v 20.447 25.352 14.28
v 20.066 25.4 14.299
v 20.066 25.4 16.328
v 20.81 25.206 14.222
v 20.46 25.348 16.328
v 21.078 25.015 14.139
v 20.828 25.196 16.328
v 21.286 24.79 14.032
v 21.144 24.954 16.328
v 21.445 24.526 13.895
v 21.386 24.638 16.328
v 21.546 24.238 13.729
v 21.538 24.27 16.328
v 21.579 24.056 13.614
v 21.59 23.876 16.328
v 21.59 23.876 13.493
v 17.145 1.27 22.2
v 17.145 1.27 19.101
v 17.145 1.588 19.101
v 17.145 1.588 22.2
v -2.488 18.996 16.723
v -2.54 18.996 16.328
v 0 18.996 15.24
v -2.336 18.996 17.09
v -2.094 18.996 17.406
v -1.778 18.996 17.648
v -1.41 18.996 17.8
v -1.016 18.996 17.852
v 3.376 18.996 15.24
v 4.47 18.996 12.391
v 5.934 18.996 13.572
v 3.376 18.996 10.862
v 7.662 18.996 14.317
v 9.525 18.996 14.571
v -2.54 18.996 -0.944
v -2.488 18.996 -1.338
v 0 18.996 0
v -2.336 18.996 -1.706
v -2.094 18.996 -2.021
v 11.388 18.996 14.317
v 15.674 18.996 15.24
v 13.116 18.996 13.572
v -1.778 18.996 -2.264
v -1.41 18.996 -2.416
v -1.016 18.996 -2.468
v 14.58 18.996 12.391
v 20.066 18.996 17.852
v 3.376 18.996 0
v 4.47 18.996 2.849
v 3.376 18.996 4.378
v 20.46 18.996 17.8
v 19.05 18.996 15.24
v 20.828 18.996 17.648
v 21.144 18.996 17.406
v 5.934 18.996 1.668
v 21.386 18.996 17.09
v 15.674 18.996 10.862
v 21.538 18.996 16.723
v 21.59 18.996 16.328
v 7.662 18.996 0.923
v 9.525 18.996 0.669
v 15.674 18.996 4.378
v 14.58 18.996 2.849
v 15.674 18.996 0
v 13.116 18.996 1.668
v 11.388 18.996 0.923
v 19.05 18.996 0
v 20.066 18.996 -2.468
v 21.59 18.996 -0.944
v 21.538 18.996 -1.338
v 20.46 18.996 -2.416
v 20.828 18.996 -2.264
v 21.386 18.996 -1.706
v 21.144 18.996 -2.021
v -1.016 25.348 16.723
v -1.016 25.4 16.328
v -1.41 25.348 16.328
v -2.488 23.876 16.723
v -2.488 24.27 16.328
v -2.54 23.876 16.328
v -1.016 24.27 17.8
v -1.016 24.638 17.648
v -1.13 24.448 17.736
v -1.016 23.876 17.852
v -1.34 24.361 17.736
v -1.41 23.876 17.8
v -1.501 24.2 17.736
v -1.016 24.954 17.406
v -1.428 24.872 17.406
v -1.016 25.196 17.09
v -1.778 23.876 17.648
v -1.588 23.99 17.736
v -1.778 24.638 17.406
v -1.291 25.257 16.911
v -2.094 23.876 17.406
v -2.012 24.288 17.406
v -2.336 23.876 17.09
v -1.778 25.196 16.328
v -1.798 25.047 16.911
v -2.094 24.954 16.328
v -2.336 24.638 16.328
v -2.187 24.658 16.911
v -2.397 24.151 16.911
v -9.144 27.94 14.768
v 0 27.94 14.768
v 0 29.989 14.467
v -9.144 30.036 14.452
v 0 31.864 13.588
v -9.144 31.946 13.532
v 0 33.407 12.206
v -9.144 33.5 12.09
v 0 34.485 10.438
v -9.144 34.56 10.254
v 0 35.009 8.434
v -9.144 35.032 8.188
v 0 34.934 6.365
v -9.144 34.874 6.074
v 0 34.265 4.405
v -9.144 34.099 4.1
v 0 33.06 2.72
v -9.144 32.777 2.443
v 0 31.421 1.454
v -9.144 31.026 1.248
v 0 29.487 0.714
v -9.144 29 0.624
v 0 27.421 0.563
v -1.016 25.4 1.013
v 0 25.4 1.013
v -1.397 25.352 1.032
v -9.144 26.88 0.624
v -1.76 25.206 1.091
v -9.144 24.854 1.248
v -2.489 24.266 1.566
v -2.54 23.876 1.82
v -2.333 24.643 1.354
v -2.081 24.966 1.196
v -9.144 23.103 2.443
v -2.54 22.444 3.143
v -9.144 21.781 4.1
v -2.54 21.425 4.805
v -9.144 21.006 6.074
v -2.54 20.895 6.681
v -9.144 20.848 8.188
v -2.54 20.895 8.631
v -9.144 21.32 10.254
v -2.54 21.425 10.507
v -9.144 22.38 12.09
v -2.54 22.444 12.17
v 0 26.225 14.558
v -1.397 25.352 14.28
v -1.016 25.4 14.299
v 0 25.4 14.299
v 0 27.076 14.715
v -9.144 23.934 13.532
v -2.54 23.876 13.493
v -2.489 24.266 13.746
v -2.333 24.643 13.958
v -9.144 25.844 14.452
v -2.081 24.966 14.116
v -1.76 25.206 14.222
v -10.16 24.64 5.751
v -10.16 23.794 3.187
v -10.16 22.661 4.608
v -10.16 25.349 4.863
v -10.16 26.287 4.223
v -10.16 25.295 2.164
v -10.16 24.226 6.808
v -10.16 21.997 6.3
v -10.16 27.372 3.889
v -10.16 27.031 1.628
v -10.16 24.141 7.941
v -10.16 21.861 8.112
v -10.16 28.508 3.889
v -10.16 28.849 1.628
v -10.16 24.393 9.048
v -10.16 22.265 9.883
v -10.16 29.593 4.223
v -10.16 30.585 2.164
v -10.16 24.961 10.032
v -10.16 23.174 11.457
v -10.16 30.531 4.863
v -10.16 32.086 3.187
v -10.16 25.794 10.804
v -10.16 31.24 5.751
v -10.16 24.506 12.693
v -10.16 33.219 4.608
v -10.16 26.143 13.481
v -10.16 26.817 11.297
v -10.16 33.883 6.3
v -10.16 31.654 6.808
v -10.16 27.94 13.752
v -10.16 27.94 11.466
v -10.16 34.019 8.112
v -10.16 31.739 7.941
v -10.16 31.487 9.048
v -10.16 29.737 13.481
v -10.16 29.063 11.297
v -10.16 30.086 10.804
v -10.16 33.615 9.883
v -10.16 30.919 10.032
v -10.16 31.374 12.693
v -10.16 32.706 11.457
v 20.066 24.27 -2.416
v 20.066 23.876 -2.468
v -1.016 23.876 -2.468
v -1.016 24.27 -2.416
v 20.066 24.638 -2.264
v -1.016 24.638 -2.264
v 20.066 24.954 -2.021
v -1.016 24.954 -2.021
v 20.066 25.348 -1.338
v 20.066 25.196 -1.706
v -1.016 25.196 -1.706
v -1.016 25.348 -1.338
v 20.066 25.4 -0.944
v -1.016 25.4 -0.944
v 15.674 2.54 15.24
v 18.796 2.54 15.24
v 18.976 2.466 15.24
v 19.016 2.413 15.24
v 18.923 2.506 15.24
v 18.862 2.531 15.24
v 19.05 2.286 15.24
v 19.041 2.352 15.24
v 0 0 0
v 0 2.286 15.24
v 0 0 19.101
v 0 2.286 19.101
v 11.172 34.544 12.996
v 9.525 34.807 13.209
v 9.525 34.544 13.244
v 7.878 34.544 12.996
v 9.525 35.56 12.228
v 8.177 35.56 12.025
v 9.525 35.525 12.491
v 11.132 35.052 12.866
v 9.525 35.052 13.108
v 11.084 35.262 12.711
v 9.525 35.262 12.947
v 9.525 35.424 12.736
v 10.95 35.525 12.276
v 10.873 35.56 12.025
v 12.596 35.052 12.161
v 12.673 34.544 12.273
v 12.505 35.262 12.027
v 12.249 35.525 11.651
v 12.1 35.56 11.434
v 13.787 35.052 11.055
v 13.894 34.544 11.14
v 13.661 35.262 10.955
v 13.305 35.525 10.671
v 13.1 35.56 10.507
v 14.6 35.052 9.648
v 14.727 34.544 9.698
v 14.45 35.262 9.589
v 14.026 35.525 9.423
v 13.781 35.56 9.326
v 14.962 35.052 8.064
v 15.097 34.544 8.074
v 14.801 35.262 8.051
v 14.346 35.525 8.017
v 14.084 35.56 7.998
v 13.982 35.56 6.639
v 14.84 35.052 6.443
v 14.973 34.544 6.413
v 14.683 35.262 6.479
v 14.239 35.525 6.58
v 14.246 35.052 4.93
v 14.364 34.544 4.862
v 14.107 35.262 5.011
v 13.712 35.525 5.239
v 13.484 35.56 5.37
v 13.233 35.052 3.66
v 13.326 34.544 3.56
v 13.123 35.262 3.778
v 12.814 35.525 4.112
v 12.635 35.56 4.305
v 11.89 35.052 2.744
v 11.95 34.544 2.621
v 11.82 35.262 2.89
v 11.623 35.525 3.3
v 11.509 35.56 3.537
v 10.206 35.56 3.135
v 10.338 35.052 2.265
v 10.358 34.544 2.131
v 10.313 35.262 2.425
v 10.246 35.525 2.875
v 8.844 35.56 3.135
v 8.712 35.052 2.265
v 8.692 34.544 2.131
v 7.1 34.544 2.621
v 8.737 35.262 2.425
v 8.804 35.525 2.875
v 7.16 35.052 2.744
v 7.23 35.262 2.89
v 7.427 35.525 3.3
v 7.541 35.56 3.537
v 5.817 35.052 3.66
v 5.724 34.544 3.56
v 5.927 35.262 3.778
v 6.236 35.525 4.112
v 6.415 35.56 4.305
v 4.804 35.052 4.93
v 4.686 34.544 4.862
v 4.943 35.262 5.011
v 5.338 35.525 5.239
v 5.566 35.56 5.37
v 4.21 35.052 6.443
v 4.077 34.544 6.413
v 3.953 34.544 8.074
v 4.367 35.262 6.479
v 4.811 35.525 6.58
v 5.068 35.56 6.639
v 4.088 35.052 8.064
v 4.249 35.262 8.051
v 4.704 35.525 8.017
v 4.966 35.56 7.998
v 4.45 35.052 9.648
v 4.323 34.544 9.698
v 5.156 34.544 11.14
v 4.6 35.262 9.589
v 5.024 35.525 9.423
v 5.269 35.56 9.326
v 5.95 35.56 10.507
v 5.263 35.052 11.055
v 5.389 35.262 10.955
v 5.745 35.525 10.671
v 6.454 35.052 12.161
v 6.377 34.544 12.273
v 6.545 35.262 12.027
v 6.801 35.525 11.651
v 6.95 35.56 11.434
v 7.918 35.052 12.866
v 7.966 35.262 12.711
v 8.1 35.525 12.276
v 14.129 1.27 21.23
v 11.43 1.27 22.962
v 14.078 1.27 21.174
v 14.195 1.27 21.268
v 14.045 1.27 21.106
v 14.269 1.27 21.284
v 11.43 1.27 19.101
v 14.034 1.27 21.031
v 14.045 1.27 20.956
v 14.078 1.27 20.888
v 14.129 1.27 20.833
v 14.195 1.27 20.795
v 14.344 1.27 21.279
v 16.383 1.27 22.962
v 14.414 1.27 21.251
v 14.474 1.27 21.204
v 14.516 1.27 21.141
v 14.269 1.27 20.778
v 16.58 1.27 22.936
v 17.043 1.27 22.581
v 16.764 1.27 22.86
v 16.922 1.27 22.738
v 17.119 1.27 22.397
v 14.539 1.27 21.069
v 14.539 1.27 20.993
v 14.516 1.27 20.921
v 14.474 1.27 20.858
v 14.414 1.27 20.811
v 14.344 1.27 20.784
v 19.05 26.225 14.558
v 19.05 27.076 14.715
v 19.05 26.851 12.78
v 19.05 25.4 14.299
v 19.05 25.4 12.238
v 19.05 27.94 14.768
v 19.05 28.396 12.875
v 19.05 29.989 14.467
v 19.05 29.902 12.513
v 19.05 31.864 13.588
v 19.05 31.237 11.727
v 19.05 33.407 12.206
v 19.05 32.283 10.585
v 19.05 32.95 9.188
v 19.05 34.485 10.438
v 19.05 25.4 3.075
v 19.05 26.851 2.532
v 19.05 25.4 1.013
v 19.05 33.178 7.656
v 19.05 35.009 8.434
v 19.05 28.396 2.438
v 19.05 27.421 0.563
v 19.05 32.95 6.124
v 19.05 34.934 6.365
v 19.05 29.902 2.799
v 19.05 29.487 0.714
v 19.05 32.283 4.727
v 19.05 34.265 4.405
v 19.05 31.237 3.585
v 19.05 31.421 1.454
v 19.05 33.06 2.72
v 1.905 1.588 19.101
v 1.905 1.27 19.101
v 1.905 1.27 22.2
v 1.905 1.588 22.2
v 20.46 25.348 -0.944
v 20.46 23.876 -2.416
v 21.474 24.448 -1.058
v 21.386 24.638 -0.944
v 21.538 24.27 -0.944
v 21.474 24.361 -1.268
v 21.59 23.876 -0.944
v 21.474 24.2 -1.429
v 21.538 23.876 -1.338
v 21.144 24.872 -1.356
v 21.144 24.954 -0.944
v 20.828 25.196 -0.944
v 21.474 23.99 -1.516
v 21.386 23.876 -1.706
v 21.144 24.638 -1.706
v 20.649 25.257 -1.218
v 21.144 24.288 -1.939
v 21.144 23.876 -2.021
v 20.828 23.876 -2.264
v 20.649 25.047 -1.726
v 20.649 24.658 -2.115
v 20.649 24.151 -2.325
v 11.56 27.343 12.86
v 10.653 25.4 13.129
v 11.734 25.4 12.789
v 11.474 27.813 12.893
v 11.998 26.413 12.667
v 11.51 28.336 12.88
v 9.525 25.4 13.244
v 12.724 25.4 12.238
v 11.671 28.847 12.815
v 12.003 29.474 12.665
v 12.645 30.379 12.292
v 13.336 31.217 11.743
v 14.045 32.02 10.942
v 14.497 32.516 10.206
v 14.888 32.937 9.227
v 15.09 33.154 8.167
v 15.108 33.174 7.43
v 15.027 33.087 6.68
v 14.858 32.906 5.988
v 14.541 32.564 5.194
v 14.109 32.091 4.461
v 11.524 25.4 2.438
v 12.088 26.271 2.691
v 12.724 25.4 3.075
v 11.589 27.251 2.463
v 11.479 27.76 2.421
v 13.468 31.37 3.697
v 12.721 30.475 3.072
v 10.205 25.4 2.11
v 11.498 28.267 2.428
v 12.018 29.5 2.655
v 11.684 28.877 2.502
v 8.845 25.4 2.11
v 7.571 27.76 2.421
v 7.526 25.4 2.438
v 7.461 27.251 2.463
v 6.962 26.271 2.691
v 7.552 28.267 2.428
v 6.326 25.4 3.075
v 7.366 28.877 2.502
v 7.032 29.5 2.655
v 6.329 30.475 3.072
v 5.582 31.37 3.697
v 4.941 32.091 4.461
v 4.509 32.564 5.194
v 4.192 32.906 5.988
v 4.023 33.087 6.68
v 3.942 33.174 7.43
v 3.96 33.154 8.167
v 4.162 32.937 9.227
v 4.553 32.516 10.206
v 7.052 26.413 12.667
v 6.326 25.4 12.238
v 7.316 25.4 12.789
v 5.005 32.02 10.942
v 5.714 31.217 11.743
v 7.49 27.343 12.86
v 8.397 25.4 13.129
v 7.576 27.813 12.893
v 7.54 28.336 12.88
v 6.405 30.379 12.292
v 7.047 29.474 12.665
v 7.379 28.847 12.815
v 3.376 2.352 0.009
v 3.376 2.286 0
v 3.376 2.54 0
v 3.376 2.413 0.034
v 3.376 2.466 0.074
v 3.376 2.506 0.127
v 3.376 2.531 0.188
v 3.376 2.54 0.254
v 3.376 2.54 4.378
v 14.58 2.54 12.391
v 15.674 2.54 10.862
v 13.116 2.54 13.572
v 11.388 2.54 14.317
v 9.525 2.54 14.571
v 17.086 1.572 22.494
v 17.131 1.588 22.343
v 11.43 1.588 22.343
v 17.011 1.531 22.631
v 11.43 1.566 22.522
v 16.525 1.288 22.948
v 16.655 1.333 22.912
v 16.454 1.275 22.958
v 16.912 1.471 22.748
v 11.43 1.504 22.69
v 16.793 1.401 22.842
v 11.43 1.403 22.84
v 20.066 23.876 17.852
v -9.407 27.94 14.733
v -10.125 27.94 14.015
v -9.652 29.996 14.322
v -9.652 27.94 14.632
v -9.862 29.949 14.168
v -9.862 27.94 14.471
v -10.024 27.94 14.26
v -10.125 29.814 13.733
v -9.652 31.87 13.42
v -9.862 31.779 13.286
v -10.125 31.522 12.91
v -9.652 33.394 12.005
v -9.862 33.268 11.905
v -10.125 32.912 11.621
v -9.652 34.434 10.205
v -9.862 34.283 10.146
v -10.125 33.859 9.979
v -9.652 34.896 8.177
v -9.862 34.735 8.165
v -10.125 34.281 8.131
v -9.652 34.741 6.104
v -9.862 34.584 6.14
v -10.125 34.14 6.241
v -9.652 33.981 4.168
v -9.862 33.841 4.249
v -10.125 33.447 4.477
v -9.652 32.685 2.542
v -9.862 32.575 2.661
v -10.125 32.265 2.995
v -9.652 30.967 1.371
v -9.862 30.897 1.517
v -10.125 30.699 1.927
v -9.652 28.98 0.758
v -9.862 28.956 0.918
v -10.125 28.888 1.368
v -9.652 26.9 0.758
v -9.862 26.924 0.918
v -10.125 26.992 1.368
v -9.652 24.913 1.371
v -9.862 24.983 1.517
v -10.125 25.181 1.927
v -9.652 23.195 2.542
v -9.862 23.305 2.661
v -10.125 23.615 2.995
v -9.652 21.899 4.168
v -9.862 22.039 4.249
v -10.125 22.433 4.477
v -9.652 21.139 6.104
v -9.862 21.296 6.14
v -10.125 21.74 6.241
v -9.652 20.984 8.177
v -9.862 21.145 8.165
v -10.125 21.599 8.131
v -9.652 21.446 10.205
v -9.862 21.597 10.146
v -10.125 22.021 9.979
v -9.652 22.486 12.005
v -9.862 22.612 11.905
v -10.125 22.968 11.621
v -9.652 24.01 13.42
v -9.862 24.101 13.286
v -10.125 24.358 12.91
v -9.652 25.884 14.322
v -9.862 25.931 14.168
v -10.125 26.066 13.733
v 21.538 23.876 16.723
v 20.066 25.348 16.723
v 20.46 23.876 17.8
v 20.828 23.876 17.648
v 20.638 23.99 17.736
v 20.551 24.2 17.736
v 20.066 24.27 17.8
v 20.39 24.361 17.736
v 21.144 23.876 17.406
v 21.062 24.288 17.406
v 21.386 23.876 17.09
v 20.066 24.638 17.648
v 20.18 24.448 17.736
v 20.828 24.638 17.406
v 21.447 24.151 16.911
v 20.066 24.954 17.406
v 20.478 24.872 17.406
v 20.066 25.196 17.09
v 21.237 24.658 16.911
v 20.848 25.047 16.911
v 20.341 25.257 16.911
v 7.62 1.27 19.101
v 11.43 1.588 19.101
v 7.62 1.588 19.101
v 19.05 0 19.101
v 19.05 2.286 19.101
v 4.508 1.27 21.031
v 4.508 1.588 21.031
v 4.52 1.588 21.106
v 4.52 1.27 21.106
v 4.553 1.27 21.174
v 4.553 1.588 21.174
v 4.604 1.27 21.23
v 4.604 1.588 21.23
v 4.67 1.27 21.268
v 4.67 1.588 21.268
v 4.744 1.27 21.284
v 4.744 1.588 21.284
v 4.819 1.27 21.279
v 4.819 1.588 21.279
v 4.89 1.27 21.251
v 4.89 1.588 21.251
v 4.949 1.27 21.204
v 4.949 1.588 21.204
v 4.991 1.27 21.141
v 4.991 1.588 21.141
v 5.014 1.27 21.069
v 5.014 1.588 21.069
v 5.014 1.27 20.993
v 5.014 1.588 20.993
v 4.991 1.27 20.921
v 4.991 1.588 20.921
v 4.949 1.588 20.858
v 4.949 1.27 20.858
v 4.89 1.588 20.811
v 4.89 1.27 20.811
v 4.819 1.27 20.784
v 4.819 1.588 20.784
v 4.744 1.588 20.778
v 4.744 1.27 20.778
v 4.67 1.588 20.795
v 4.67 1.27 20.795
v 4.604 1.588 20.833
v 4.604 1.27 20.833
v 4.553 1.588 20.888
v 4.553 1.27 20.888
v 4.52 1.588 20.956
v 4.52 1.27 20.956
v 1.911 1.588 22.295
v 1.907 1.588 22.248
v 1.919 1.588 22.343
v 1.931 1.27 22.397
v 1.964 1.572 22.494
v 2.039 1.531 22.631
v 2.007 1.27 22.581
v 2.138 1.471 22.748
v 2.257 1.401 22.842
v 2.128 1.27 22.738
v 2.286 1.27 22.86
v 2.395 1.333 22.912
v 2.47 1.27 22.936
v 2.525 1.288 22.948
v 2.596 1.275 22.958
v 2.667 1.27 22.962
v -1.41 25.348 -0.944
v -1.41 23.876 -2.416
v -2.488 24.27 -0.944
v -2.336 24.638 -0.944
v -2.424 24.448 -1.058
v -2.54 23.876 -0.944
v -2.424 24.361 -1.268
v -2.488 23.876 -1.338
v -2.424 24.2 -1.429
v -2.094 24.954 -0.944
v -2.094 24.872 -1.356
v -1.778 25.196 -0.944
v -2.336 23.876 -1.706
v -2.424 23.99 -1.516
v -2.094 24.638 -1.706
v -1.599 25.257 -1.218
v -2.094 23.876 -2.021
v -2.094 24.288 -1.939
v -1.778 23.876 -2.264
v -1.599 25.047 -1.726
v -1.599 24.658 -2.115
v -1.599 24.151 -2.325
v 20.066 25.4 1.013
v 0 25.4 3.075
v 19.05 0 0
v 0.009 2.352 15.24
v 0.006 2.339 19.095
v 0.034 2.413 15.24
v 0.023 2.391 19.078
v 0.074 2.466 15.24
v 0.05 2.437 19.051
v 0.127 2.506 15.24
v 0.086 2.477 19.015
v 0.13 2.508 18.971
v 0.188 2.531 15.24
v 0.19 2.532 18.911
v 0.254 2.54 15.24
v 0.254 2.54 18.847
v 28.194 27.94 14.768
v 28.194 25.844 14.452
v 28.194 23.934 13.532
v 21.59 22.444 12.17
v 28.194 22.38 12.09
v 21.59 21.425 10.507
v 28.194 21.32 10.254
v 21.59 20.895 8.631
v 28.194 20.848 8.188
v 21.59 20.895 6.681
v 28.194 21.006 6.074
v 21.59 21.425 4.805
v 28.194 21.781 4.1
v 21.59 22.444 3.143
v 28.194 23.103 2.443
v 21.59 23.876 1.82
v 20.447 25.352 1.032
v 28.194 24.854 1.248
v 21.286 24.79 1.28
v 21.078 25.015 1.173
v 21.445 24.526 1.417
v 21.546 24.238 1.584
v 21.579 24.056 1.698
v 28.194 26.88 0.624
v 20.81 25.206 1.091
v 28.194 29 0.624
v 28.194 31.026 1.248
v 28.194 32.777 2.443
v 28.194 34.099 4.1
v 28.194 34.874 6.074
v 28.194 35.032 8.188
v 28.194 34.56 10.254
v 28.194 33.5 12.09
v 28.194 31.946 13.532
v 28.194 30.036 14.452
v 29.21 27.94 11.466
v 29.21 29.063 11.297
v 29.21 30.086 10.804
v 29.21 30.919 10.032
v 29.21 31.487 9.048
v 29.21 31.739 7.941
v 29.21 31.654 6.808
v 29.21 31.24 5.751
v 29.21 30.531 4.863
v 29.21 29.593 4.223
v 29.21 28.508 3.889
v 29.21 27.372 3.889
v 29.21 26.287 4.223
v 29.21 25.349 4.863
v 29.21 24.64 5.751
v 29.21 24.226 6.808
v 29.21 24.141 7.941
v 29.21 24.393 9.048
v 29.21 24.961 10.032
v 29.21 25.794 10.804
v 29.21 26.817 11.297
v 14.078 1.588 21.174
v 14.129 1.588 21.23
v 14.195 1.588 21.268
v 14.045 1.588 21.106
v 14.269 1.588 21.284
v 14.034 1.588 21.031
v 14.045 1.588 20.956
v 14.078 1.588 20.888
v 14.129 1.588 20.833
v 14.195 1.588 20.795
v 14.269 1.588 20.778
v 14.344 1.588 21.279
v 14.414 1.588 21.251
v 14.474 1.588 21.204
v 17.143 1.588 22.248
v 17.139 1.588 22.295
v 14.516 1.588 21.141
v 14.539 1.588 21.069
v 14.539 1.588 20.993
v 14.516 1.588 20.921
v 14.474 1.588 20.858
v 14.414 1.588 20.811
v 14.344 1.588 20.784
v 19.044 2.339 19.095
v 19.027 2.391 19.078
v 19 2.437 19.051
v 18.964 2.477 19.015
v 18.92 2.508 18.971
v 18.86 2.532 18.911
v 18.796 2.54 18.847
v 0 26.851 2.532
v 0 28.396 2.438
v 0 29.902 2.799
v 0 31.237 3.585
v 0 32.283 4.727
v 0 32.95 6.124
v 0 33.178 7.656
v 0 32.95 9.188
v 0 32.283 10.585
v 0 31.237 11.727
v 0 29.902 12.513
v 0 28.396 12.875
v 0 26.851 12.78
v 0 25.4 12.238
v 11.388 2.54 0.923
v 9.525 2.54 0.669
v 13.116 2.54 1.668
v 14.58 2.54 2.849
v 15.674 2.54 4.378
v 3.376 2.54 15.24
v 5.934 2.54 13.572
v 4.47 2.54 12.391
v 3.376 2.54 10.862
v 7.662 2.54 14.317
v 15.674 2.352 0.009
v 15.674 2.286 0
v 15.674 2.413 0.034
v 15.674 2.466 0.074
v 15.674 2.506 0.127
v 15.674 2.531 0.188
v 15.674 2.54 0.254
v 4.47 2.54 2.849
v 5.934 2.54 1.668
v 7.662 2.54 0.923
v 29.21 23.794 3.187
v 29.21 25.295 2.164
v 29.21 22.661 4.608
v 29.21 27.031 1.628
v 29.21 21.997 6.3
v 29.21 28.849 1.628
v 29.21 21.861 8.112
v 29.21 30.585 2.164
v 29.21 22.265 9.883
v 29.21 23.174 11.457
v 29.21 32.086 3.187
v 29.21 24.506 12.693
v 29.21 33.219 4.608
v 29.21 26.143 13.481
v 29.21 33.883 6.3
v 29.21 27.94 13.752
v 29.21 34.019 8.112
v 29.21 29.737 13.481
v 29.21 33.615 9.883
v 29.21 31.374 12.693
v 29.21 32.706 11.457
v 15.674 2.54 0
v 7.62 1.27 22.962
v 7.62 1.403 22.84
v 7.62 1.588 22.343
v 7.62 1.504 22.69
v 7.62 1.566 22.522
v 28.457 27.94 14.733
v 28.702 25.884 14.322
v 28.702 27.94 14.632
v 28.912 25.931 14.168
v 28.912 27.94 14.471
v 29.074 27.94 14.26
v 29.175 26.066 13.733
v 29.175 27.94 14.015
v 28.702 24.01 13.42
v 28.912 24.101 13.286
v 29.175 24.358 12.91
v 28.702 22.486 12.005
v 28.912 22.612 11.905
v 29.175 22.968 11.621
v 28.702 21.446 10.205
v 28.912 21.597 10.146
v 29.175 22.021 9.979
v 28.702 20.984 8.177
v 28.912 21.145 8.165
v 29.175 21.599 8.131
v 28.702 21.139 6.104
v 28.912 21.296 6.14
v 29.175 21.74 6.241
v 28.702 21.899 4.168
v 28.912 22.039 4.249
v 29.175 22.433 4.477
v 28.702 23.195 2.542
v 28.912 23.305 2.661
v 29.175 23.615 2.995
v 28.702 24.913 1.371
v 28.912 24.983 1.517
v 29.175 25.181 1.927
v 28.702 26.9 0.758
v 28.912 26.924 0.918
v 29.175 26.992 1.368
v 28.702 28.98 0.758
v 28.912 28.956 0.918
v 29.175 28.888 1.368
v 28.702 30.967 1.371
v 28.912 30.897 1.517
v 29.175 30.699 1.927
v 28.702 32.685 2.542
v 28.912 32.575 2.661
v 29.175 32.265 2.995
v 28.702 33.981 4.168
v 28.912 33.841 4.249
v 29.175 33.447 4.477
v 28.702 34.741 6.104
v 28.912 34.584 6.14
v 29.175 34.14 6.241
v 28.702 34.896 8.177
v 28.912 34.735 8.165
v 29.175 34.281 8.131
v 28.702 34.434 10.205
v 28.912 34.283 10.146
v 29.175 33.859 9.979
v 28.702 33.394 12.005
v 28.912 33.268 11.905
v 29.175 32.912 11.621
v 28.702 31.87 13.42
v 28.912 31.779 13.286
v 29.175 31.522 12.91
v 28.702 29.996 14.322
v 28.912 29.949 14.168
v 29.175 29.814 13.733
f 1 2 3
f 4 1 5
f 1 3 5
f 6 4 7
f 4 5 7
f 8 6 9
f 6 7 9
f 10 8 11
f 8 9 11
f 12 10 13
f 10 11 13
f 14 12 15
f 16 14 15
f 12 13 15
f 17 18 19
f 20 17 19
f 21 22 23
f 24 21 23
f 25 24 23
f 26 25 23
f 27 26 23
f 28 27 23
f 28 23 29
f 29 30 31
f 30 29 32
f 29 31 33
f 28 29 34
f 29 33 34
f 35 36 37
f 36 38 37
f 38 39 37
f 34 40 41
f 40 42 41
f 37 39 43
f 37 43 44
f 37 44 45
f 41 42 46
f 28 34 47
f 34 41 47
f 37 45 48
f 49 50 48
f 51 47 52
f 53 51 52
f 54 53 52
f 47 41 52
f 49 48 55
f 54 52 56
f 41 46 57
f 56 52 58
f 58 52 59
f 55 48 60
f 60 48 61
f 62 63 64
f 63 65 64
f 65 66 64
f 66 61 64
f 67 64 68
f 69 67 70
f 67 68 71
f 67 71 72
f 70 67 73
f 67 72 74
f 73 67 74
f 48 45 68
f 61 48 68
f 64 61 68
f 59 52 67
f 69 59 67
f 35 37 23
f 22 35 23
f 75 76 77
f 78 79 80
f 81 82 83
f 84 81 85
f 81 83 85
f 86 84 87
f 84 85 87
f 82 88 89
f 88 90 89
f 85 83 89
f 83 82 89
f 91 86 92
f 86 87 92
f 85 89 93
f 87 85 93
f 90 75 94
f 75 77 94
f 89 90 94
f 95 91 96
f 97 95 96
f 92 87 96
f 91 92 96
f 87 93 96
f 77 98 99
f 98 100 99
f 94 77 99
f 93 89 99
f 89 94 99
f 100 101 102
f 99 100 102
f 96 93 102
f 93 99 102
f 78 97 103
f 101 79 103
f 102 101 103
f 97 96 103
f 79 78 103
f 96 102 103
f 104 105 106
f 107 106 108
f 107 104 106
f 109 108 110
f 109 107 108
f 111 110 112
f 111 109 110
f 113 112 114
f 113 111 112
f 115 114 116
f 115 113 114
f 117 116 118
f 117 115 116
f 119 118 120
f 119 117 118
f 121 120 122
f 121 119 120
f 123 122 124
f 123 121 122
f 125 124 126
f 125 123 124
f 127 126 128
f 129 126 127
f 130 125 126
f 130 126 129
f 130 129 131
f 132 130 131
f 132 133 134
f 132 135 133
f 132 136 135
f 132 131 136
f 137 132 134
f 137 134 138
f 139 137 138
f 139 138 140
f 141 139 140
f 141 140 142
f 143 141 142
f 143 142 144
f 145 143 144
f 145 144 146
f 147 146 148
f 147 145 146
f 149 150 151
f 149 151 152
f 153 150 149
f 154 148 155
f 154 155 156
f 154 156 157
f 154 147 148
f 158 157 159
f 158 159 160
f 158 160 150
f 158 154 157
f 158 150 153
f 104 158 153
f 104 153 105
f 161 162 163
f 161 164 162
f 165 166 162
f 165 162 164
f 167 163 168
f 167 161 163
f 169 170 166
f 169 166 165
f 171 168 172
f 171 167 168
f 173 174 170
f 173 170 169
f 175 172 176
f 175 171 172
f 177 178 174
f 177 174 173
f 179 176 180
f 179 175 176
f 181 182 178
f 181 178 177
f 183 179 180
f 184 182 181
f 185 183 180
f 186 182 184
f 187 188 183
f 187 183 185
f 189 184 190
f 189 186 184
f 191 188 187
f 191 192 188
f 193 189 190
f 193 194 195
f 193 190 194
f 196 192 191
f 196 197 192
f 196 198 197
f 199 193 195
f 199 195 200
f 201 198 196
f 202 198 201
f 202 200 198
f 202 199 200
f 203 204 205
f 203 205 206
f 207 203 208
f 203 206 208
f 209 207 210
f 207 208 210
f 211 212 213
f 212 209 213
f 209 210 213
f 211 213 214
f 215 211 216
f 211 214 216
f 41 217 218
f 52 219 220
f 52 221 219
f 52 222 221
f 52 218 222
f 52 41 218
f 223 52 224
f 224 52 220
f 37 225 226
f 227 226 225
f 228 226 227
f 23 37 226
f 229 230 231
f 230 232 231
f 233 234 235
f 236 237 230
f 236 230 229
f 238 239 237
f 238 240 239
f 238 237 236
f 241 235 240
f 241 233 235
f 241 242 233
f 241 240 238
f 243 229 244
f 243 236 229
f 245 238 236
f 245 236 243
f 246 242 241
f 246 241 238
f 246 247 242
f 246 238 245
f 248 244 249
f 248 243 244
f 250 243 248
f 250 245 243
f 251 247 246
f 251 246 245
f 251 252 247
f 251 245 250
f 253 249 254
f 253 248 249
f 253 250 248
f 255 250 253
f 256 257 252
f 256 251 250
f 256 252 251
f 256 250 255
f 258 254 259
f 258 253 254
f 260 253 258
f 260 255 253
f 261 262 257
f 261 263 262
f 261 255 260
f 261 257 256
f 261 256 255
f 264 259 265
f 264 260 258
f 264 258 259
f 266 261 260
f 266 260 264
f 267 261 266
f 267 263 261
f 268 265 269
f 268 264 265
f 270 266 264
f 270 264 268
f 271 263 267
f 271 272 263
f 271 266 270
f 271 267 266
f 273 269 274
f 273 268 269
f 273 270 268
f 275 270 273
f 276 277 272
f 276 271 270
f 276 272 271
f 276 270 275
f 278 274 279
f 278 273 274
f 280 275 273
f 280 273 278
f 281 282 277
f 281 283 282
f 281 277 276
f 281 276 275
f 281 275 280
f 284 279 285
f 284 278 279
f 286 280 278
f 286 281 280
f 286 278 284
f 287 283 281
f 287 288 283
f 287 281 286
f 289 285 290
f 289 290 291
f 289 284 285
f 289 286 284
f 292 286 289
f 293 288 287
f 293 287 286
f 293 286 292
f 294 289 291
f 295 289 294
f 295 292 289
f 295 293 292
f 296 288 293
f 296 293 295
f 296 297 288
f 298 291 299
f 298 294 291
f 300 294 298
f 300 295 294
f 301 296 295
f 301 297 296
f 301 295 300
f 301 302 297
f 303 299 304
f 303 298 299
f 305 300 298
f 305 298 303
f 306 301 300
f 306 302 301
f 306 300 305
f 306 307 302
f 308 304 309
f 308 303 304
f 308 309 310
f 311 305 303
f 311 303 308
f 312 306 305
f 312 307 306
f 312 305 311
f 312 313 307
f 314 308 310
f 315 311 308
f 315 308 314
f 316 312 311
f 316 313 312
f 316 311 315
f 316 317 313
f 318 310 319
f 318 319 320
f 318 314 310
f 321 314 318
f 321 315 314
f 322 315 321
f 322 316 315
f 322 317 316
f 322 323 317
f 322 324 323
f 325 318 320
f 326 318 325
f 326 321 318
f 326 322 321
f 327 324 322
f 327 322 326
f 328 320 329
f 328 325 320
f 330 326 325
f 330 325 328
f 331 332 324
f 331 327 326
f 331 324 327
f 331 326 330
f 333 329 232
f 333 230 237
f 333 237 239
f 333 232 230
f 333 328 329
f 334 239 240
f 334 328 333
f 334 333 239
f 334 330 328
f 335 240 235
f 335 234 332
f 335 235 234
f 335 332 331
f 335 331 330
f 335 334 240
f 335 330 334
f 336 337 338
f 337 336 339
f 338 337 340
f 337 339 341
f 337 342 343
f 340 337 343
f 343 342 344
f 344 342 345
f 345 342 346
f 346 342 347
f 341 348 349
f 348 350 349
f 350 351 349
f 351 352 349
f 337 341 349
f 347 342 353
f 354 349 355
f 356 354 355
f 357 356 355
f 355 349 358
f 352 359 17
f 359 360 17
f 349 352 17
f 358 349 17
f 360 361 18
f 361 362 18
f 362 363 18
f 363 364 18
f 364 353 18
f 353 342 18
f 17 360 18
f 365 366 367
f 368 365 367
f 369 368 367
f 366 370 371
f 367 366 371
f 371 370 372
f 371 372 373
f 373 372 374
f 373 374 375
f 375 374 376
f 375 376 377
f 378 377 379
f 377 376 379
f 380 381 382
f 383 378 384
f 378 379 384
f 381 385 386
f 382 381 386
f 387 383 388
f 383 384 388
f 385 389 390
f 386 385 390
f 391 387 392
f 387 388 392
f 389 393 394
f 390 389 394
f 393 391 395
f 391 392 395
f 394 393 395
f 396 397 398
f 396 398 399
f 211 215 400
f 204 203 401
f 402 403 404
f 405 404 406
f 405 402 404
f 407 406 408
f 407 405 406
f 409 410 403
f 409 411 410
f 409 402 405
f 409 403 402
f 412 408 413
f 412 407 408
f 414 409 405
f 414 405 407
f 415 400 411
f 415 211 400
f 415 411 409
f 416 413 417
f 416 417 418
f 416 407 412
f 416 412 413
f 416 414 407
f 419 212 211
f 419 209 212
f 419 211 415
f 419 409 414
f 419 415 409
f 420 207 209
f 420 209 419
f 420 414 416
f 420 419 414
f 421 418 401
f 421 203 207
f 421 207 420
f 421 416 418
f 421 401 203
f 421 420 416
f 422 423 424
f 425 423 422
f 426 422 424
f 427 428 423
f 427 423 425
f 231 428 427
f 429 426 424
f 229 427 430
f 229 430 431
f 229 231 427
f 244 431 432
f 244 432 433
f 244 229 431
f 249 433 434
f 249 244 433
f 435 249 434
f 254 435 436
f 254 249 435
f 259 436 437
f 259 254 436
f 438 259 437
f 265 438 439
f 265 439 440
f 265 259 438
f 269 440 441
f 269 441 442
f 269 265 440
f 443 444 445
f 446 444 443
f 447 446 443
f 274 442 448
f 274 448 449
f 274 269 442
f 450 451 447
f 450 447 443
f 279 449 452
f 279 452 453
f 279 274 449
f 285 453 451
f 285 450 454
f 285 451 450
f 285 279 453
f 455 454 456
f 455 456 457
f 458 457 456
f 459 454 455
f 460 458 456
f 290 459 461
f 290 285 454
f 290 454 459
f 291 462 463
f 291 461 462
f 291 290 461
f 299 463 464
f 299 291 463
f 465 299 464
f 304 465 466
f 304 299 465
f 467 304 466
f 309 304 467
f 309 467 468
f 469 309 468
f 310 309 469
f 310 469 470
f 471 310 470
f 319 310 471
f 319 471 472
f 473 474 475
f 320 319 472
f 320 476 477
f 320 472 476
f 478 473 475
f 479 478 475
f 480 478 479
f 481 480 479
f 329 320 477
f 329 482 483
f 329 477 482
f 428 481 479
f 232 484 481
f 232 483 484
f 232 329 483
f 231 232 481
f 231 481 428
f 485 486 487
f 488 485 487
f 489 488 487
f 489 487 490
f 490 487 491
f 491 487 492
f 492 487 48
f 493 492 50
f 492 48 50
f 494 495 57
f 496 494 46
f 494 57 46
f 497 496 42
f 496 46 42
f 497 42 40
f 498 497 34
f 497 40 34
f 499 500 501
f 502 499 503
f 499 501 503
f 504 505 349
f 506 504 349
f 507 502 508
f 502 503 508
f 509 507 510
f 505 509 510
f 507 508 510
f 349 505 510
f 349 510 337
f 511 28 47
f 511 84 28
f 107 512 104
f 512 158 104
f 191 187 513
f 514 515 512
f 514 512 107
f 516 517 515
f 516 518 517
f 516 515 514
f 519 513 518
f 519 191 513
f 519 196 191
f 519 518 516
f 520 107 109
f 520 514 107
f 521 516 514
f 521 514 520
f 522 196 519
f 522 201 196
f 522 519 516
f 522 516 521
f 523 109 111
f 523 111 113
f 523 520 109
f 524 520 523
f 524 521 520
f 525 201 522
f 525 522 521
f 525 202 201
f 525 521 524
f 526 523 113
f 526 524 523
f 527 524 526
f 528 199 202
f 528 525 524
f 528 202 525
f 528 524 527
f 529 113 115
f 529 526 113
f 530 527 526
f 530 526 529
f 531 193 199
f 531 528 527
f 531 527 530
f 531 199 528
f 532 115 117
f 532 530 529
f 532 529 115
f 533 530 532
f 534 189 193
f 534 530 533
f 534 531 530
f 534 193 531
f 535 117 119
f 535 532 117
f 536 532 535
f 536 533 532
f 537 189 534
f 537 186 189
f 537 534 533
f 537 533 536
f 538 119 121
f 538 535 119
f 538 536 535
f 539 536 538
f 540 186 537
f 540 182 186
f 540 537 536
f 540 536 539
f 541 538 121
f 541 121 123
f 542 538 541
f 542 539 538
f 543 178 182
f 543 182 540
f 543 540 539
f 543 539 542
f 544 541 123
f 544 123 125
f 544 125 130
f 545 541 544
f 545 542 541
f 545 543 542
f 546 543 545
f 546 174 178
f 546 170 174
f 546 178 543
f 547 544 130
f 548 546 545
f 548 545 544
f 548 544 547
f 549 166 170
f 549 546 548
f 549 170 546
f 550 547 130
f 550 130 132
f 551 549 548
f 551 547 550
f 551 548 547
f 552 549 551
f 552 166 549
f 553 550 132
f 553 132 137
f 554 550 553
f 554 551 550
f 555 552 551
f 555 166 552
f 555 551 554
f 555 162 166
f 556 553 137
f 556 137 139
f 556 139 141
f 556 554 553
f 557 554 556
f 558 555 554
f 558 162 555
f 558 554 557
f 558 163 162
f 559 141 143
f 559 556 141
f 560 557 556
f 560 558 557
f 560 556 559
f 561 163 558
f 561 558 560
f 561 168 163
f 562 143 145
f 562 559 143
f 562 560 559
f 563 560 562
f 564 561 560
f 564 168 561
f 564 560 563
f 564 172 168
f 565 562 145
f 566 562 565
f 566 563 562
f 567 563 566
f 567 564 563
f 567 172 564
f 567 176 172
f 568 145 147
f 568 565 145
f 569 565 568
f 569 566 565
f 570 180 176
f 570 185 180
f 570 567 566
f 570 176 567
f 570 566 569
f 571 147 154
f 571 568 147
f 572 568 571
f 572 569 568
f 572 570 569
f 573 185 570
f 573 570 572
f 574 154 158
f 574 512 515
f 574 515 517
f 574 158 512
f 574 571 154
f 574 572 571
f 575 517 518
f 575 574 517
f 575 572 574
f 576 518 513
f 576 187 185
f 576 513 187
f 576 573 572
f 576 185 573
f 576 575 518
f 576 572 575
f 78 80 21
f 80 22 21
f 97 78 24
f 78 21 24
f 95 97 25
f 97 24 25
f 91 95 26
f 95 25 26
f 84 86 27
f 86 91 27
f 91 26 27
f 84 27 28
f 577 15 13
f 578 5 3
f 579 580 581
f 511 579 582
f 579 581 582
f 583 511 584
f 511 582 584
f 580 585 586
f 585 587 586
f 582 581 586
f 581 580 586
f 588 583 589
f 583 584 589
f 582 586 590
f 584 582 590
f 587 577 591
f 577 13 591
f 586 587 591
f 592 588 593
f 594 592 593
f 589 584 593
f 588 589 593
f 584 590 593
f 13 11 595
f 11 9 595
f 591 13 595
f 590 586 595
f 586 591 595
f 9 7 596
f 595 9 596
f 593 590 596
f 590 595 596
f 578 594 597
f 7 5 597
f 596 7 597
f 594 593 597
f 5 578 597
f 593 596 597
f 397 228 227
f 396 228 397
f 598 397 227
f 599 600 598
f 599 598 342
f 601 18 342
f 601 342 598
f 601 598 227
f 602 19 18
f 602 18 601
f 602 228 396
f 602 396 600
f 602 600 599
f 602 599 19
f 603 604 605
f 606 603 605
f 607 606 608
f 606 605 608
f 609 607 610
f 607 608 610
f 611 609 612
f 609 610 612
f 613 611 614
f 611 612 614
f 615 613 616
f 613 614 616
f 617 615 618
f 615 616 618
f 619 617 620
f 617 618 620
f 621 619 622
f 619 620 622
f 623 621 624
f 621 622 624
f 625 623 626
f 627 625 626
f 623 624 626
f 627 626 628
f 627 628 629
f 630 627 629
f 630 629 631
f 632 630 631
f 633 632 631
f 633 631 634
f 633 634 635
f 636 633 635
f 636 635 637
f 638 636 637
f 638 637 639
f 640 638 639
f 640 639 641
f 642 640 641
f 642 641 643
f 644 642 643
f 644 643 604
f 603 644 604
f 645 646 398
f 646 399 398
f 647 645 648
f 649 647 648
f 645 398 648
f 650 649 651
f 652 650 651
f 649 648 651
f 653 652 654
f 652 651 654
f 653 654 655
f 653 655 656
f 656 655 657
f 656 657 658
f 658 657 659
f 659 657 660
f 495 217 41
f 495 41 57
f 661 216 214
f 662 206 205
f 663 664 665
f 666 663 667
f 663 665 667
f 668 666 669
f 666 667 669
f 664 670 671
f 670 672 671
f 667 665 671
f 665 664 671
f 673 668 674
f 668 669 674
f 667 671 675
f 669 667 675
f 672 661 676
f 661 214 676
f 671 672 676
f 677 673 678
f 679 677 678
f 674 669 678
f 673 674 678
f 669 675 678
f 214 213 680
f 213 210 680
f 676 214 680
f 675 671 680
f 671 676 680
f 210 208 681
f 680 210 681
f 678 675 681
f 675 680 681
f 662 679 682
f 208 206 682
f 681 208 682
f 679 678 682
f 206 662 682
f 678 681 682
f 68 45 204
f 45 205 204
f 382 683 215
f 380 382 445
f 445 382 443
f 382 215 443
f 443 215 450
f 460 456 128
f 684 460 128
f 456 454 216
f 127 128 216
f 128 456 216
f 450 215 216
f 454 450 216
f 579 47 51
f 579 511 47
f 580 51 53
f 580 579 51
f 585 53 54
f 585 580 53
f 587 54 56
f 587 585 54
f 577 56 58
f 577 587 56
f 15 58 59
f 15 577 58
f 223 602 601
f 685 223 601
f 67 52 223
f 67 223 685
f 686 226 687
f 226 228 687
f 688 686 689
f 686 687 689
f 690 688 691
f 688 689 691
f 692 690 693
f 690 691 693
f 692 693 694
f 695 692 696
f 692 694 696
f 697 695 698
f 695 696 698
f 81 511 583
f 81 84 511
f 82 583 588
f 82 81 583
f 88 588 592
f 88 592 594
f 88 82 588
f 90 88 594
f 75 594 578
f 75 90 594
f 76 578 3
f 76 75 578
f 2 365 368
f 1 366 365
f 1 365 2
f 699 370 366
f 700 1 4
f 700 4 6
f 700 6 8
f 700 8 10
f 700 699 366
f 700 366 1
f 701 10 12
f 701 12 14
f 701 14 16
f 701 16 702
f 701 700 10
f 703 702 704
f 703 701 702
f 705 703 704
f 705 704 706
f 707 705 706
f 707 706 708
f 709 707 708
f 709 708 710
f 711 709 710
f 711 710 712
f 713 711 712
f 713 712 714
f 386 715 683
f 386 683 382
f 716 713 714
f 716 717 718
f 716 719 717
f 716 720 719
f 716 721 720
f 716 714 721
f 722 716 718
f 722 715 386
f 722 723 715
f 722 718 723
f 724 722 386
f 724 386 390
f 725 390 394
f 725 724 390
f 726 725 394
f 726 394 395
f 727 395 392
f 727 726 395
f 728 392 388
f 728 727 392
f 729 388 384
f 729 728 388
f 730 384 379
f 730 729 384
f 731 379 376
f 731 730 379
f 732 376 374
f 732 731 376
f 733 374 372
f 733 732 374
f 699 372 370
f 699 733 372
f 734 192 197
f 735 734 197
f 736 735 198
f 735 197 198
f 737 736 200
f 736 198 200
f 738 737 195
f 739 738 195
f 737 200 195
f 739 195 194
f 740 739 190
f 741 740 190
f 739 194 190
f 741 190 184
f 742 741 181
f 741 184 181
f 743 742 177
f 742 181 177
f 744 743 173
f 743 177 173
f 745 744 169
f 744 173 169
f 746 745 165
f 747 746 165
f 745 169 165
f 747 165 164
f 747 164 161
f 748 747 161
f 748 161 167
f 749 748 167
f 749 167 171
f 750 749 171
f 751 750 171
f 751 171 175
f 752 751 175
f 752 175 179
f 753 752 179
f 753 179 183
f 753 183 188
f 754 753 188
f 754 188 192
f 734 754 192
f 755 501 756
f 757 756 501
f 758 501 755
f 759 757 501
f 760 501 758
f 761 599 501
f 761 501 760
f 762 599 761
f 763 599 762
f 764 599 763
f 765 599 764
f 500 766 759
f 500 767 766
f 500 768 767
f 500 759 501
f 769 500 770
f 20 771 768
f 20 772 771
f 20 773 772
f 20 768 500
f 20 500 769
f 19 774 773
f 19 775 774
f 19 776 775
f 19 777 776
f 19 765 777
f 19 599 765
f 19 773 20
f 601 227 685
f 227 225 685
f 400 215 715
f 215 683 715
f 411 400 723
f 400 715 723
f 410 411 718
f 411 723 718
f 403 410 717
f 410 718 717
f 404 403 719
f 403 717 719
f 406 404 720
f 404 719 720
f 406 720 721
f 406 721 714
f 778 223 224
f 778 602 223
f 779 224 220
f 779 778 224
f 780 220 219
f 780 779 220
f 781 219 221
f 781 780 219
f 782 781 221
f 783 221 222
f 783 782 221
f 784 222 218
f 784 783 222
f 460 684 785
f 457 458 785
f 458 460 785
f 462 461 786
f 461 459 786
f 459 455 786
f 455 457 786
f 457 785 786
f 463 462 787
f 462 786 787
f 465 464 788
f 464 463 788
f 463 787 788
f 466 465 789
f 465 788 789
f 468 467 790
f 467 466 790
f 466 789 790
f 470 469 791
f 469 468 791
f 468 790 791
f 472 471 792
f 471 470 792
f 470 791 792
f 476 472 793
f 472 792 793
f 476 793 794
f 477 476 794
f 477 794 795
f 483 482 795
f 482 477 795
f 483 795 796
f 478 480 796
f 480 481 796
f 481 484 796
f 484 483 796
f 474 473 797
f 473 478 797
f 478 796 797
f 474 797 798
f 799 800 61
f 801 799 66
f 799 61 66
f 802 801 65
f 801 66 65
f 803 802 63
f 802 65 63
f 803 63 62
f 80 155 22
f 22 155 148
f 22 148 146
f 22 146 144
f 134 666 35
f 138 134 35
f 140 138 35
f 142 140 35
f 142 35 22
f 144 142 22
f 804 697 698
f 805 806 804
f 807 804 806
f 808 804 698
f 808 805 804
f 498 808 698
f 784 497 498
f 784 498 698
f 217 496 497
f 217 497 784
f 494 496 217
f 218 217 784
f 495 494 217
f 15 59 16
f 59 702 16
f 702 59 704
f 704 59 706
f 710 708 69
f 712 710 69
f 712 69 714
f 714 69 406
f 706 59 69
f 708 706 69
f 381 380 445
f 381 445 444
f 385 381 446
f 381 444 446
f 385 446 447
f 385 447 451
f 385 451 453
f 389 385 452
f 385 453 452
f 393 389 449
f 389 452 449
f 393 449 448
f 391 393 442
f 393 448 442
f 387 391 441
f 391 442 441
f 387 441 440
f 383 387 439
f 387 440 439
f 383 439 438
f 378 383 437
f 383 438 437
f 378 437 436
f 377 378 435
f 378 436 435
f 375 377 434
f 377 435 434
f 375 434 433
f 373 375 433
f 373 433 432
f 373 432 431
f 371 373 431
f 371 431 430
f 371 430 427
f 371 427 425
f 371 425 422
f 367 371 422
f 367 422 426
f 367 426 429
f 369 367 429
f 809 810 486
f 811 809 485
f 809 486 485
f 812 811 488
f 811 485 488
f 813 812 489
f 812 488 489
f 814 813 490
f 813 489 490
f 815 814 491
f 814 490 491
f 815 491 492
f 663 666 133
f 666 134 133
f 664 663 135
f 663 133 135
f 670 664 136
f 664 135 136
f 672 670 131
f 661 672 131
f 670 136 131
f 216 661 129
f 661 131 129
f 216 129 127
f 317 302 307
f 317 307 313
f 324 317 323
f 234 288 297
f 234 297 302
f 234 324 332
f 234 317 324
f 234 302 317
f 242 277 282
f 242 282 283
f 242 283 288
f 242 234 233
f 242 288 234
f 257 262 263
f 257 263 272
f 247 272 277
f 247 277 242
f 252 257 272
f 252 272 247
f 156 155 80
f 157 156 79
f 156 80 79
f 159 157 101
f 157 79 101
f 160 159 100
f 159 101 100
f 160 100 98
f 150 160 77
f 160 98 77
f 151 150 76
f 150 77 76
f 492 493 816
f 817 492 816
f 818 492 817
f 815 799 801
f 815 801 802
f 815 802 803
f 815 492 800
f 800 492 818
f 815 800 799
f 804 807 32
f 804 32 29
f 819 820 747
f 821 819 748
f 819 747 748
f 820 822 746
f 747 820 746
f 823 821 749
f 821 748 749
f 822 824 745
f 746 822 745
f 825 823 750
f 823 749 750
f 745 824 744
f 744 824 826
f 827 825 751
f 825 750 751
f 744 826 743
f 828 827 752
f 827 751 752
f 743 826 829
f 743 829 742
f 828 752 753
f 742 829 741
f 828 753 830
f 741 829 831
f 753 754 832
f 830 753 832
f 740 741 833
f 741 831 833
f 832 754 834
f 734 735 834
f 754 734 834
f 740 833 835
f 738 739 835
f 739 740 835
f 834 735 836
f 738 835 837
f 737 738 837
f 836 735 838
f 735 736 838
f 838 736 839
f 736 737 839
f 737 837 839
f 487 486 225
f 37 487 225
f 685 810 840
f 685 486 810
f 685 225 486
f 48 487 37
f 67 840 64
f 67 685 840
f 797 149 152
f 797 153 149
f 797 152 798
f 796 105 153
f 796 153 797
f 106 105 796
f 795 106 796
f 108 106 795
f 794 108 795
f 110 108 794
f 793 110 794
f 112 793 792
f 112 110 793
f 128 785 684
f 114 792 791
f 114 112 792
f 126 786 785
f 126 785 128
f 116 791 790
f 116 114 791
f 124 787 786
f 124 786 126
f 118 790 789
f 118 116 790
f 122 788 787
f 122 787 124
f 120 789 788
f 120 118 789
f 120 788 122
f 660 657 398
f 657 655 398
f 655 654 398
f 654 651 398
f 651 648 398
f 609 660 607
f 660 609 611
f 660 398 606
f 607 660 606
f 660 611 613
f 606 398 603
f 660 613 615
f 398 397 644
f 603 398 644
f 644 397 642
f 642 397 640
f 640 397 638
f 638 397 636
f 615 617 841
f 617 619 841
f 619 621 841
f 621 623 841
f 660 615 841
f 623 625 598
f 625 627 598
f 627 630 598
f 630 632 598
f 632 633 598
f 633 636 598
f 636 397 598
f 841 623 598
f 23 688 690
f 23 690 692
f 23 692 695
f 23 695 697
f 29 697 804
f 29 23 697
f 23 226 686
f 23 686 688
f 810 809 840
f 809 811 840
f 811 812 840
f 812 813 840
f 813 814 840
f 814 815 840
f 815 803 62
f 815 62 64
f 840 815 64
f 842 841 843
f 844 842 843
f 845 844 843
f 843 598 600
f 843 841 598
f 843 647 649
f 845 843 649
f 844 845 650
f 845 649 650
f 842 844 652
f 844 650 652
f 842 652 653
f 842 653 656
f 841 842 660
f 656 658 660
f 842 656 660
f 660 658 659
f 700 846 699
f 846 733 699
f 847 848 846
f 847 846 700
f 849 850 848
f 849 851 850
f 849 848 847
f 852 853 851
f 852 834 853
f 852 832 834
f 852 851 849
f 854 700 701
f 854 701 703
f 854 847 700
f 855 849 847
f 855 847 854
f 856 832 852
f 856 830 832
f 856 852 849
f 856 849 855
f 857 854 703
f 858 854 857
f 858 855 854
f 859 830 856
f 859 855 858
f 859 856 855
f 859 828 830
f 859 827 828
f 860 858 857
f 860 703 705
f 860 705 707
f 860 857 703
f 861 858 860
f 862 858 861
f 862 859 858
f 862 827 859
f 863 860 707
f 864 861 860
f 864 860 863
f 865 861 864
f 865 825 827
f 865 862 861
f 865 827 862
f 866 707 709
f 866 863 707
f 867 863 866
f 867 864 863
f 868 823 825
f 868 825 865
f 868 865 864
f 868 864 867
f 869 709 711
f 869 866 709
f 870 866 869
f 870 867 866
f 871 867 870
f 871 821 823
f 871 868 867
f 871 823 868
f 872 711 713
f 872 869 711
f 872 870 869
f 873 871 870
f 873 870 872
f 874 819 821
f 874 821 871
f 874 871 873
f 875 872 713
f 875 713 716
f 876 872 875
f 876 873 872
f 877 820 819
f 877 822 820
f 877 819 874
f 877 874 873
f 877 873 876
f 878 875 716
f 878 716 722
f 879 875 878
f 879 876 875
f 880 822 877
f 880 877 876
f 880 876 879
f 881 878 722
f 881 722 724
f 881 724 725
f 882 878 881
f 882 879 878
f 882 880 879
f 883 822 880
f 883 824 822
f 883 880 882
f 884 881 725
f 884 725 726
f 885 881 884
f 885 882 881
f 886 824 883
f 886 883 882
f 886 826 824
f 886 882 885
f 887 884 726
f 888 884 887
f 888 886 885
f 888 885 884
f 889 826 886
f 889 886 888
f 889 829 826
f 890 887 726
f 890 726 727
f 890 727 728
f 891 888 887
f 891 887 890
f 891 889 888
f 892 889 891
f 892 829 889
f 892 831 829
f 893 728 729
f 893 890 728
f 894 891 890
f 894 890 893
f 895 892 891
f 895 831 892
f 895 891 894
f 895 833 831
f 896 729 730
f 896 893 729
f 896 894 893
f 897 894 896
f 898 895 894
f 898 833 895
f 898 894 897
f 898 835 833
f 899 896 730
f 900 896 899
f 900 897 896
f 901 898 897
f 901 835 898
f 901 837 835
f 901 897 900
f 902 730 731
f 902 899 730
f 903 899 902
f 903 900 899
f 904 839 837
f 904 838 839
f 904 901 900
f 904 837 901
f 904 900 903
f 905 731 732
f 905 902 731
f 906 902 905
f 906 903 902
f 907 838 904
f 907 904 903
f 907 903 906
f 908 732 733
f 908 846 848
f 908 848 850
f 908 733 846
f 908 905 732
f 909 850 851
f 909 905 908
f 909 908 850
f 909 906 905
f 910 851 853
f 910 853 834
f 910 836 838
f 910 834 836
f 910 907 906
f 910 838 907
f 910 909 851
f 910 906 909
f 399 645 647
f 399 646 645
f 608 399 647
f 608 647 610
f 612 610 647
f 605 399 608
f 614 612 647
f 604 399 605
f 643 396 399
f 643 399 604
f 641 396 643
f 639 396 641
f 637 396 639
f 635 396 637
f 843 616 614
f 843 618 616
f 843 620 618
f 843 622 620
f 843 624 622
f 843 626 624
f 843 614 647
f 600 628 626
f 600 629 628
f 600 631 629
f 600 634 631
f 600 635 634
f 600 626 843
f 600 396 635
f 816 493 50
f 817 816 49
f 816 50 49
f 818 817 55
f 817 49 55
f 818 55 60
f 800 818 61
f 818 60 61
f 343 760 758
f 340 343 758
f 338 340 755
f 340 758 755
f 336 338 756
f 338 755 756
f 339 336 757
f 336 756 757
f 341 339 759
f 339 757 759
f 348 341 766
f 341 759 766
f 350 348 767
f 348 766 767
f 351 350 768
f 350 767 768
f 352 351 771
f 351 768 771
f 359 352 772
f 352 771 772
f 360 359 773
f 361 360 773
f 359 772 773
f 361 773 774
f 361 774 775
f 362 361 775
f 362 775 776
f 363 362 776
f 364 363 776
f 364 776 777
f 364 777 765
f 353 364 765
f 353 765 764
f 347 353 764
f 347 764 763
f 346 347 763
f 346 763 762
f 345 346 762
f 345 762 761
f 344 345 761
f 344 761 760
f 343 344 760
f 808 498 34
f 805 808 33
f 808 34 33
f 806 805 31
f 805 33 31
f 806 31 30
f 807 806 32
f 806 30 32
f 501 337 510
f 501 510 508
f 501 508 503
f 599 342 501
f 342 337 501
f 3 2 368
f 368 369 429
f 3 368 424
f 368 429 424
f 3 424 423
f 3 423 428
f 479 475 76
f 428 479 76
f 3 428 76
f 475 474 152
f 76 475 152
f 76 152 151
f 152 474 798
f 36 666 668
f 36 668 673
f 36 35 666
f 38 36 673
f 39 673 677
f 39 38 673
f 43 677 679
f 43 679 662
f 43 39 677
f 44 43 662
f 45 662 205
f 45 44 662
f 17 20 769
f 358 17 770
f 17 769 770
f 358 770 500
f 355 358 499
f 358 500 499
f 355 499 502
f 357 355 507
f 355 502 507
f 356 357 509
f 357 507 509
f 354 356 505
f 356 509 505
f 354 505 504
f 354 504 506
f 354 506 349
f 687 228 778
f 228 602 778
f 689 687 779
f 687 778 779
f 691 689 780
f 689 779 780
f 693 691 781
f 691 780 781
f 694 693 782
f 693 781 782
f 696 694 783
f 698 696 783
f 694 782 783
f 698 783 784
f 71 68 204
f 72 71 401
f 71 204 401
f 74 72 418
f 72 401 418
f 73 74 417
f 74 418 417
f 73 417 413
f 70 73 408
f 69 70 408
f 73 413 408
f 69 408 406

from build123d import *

# Parameters (mm, degrees)
SKETCH1_W                = 19.05
SKETCH1_H                = 19.05
BOSS_EXTRUDE1_DEPTH      = 15.24
SKETCH2_W                = 19.05
SKETCH2_H                = 2.54
BOSS_EXTRUDE2_DEPTH      = 3.8608
SKETCH3_W                = 5.715
SKETCH3_H                = 0.317516884
BOSS_EXTRUDE3_DEPTH      = 3.8608
SKETCH4_R                = 0.254
CUT_EXTRUDE1_DEPTH       = 3.8608
CUT_EXTRUDE2_DEPTH       = 16.51
BOSS_EXTRUDE4_DEPTH      = 10.16
BOSS_EXTRUDE4_DEPTH_BACK = 29.21
SKETCH6_W                = 15.312192665
SKETCH6_H                = 16.51
SKETCH7_OUTSIDE_W        = 36.524
SKETCH7_OUTSIDE_H        = 49.122
SKETCH7_OUTSIDE_R        = 7.112
CUT_EXTRUDE3_DEPTH       = 10.16
SKETCH8_OUTSIDE_W        = 36.524
SKETCH8_OUTSIDE_H        = 49.122
SKETCH8_OUTSIDE_R        = 7.112
CUT_EXTRUDE4_DEPTH       = 10.16
SKETCH9_W                = 19.05
SKETCH9_H                = 15.312192665
SKETCH9_R                = 5.588
CUT_EXTRUDE6_DEPTH       = 10.16
SKETCH10_R               = 5.238445082
BOSS_EXTRUDE5_DEPTH      = 20.32
BOSS_EXTRUDE6_DEPTH      = 2.54
BOSS_EXTRUDE6_DEPTH_BACK = 17.78
SKETCH11_W               = 19.05
SKETCH11_H               = 6.35
FILLET1_R                = 1.524
FILLET2_R                = 1.016
FILLET3_R                = 1.016
FILLET5_R                = 0.762
FILLET6_R                = 0.254
SKETCH12_R               = 3.81
CUT_EXTRUDE7_DEPTH       = 58.807833199


with BuildPart() as part:
    # Sketch1 → Boss-Extrude1 (new body)
    with BuildSketch(Plane.XY):
        with Locations((9.525, 9.525)):
            Rectangle(SKETCH1_W, SKETCH1_H)
    extrude(amount=BOSS_EXTRUDE1_DEPTH)

    # Sketch2 → Boss-Extrude2 (add)
    with BuildSketch(Plane.XY.offset(15.24)):
        with Locations((9.525, 1.27)):
            Rectangle(SKETCH2_W, SKETCH2_H)
    extrude(amount=BOSS_EXTRUDE2_DEPTH)

    # Sketch3 → Boss-Extrude3 (add)
    with BuildSketch(Plane.XY.offset(19.1008)):
        with Locations((14.2875, 1.428758442)):
            Rectangle(SKETCH3_W, SKETCH3_H)
        with Locations((4.7625, 1.428758442)):
            Rectangle(SKETCH3_W, SKETCH3_H)
    extrude(amount=BOSS_EXTRUDE3_DEPTH)

    # Sketch4 → Cut-Extrude1 (cut)
    with BuildSketch(Plane(origin=(0, 1.587516884, 0), x_dir=(1, 0, 0), z_dir=(0, 1, 0))):
        with Locations(Location((4.7625, -21.0312, 0), (0, 0, 180))):
            Circle(SKETCH4_R)
        with Locations(Location((14.2875, -21.0312, 0), (0, 0, 180))):
            Circle(SKETCH4_R)
    extrude(amount=-CUT_EXTRUDE1_DEPTH, mode=Mode.SUBTRACT)

    # Sketch5 → Cut-Extrude2 (cut)
    with BuildSketch(Plane(origin=(0, 19.05, 0), x_dir=(1, 0, 0), z_dir=(0, 1, 0))):
        with BuildLine():
            ThreePointArc((15.673821391, -10.861568969), (13.115527413, -13.571796937), (9.525, -14.57095489))
            Line((9.525, -14.57095489), (9.525, -15.24))
            Line((9.525, -15.24), (15.673821391, -15.24))
            Line((15.673821391, -15.24), (15.673821391, -10.861568969))
        make_face()
        with BuildLine():
            ThreePointArc((9.525, -14.57095489), (5.934472587, -13.571796937), (3.376178609, -10.861568969))
            Line((3.376178609, -10.861568969), (3.376178609, -15.24))
            Line((3.376178609, -15.24), (9.525, -15.24))
            Line((9.525, -15.24), (9.525, -14.57095489))
        make_face()
        with BuildLine():
            Line((9.525, 0), (3.376178609, 0))
            Line((3.376178609, 0), (3.376178609, -4.378431031))
            ThreePointArc((3.376178609, -4.378431031), (5.934472587, -1.668203063), (9.525, -0.66904511))
            Line((9.525, -0.66904511), (9.525, 0))
        make_face()
        with BuildLine():
            Line((15.673821391, 0), (9.525, 0))
            Line((9.525, 0), (9.525, -0.66904511))
            ThreePointArc((9.525, -0.66904511), (13.115527413, -1.668203063), (15.673821391, -4.378431031))
            Line((15.673821391, -4.378431031), (15.673821391, 0))
        make_face()
    extrude(amount=-CUT_EXTRUDE2_DEPTH, mode=Mode.SUBTRACT)

    # Sketch6 → Boss-Extrude4 (add, two sides: drawn at the far end of the back side and taken through both)
    with BuildSketch(Plane.ZY.offset(-BOSS_EXTRUDE4_DEPTH_BACK)):
        with Locations((7.656096333, 27.305)):
            Rectangle(SKETCH6_W, SKETCH6_H)
    extrude(amount=BOSS_EXTRUDE4_DEPTH + BOSS_EXTRUDE4_DEPTH_BACK)

    # Sketch7 outside → Cut-Extrude3 (cut)
    with BuildSketch(Plane.ZY.offset(10.16)):
        with Locations((11.481, 17.78)):
            Rectangle(SKETCH7_OUTSIDE_W, SKETCH7_OUTSIDE_H)
        with Locations((7.656096333, 27.94)):
            Circle(SKETCH7_OUTSIDE_R, mode=Mode.SUBTRACT)
    extrude(amount=-CUT_EXTRUDE3_DEPTH, mode=Mode.SUBTRACT)

    # Sketch8 outside → Cut-Extrude4 (cut)
    with BuildSketch(Plane(origin=(29.21, 0, 0), x_dir=(0, 0, -1), z_dir=(1, 0, 0))):
        with Locations((-11.481, 17.78)):
            Rectangle(SKETCH8_OUTSIDE_W, SKETCH8_OUTSIDE_H)
        with Locations(Location((-7.656096333, 27.94, 0), (0, 0, 180))):
            Circle(SKETCH8_OUTSIDE_R, mode=Mode.SUBTRACT)
    extrude(amount=-CUT_EXTRUDE4_DEPTH, mode=Mode.SUBTRACT)

    # Sketch9 → Cut-Extrude6 (cut)
    with BuildSketch(Plane(origin=(0, 35.56, 0), x_dir=(1, 0, 0), z_dir=(0, 1, 0))):
        with Locations((9.525, -7.656096333)):
            Rectangle(SKETCH9_W, SKETCH9_H)
        with Locations(Location((9.525, -7.656096333, 0), (0, 0, 270))):
            Circle(SKETCH9_R, mode=Mode.SUBTRACT)
    extrude(amount=-CUT_EXTRUDE6_DEPTH, mode=Mode.SUBTRACT)

    # Sketch10 → Boss-Extrude5 (add)
    with BuildSketch(Plane(origin=(0, 0, 0), x_dir=(0, 0, -1), z_dir=(1, 0, 0))):
        with Locations((-7.656096333, 27.94)):
            Circle(SKETCH10_R)
    extrude(amount=BOSS_EXTRUDE5_DEPTH)

    # Sketch11 → Boss-Extrude6 (add, two sides: drawn at the far end of the back side and taken through both)
    with BuildSketch(Plane.XY.offset(15.312192665).offset(-BOSS_EXTRUDE6_DEPTH_BACK)):
        with Locations((9.525, 22.225)):
            Rectangle(SKETCH11_W, SKETCH11_H)
        Polygon((0, 19.05), (0, 25.4), (-2.54, 25.4), (-2.54, 18.996030985), (0, 18.996030985), align=None)
        Polygon((21.59, 25.4), (19.05, 25.4), (19.05, 19.05), (0, 19.05), (0, 18.996030985), (21.59, 18.996030985), align=None)
    extrude(amount=BOSS_EXTRUDE6_DEPTH + BOSS_EXTRUDE6_DEPTH_BACK)

    # Fillet1
    fillet1_edges = [part.edges().sort_by_distance(p)[0] for p in [
        (-2.54, 25.4, 16.075625494),
        (9.525, 25.4, -2.467807335),
        (-2.54, 25.4, -0.727336496),
        (-2.54, 22.198015493, -2.467807335),
        (21.59, 25.4, 16.075625494),
        (21.59, 22.198015493, 17.852192665),
        (21.59, 25.4, -0.727336496),
        (21.59, 22.198015493, -2.467807335),
        (9.525, 25.4, 17.852192665),
        (-2.54, 22.198015493, 17.852192665),
    ]]
    fillet(fillet1_edges, radius=FILLET1_R)

    # Fillet2
    fillet2_edges = [part.edges().sort_by_distance(p)[0] for p in [
        (9.525, 35.56, 2.068096333),
    ]]
    fillet(fillet2_edges, radius=FILLET2_R)

    # Fillet3
    fillet3_edges = [part.edges().sort_by_distance(p)[0] for p in [
        (-10.16, 27.94, 0.544096333),
        (29.21, 27.94, 0.544096333),
    ]]
    fillet(fillet3_edges, radius=FILLET3_R)

    # Fillet5
    # the kernel refuses this fillet: 0.762 mm, written as the material it takes off along each edge
    with BuildSketch(Plane(origin=(17.145, 3.492516884, 22.9616), x_dir=(0, 0, -1), z_dir=(0, -1, 0)), Plane(origin=(1.905, -0.635, 22.9616), x_dir=(0, 0, -1), z_dir=(0, 1, 0))) as fillet5_piece_1:
        with BuildLine():
            CenterArc((FILLET5_R, -FILLET5_R), FILLET5_R, 90, 90)
            Line((0, -FILLET5_R), (-FILLET5_R * 0.02, -FILLET5_R))
            Line((-FILLET5_R * 0.02, -FILLET5_R), (-FILLET5_R * 0.02, FILLET5_R * 0.02))
            Line((-FILLET5_R * 0.02, FILLET5_R * 0.02), (FILLET5_R, FILLET5_R * 0.02))
            Line((FILLET5_R, FILLET5_R * 0.02), (FILLET5_R, 0))
        make_face()
    fillet5_piece_1_solid = extrude(amount=4.127516884, mode=Mode.PRIVATE)
    with BuildSketch(Plane(origin=(9.882666084, 1.587516884, 22.9616), x_dir=(0, 0, -1), z_dir=(1, 0, 0)), Plane(origin=(0.357666084, 1.587516884, 22.9616), x_dir=(0, 0, -1), z_dir=(1, 0, 0))) as fillet5_piece_2:
        with BuildLine():
            CenterArc((0.618933566, -0.762), FILLET5_R, 90, 54.316228291)
            Line((0, -0.317516884), (-0.012378671, -0.308627222))
            ThreePointArc((-0.012378671, -0.308627222), (-0.01524, -0.158758442), (-0.01524, 0))
            Line((-0.01524, 0), (0, 0.01524))
            Line((0, 0.01524), (0.618933566, 0.01524))
            Line((0.618933566, 0.01524), (0.618933566, 0))
        make_face()
    fillet5_piece_2_solid = extrude(amount=8.809667832, mode=Mode.PRIVATE)
    add([fillet5_piece_1_solid, fillet5_piece_2_solid], mode=Mode.SUBTRACT)

    # Fillet6
    fillet6_edges = [part.edges().sort_by_distance(p)[0] for p in [
        (0, 2.54, 17.1704),
        (19.05, 2.54, 17.1704),
        (9.525, 2.54, 19.1008),
        (9.525, 2.54, 0),
    ]]
    fillet(fillet6_edges, radius=FILLET6_R)

    # Sketch12 → Cut-Extrude7 (cut, through all)
    with BuildSketch(Plane.ZY.offset(10.16)):
        with Locations((7.656096333, 27.94)):
            Circle(SKETCH12_R)
    extrude(amount=-CUT_EXTRUDE7_DEPTH, mode=Mode.SUBTRACT)


solid = part.part
